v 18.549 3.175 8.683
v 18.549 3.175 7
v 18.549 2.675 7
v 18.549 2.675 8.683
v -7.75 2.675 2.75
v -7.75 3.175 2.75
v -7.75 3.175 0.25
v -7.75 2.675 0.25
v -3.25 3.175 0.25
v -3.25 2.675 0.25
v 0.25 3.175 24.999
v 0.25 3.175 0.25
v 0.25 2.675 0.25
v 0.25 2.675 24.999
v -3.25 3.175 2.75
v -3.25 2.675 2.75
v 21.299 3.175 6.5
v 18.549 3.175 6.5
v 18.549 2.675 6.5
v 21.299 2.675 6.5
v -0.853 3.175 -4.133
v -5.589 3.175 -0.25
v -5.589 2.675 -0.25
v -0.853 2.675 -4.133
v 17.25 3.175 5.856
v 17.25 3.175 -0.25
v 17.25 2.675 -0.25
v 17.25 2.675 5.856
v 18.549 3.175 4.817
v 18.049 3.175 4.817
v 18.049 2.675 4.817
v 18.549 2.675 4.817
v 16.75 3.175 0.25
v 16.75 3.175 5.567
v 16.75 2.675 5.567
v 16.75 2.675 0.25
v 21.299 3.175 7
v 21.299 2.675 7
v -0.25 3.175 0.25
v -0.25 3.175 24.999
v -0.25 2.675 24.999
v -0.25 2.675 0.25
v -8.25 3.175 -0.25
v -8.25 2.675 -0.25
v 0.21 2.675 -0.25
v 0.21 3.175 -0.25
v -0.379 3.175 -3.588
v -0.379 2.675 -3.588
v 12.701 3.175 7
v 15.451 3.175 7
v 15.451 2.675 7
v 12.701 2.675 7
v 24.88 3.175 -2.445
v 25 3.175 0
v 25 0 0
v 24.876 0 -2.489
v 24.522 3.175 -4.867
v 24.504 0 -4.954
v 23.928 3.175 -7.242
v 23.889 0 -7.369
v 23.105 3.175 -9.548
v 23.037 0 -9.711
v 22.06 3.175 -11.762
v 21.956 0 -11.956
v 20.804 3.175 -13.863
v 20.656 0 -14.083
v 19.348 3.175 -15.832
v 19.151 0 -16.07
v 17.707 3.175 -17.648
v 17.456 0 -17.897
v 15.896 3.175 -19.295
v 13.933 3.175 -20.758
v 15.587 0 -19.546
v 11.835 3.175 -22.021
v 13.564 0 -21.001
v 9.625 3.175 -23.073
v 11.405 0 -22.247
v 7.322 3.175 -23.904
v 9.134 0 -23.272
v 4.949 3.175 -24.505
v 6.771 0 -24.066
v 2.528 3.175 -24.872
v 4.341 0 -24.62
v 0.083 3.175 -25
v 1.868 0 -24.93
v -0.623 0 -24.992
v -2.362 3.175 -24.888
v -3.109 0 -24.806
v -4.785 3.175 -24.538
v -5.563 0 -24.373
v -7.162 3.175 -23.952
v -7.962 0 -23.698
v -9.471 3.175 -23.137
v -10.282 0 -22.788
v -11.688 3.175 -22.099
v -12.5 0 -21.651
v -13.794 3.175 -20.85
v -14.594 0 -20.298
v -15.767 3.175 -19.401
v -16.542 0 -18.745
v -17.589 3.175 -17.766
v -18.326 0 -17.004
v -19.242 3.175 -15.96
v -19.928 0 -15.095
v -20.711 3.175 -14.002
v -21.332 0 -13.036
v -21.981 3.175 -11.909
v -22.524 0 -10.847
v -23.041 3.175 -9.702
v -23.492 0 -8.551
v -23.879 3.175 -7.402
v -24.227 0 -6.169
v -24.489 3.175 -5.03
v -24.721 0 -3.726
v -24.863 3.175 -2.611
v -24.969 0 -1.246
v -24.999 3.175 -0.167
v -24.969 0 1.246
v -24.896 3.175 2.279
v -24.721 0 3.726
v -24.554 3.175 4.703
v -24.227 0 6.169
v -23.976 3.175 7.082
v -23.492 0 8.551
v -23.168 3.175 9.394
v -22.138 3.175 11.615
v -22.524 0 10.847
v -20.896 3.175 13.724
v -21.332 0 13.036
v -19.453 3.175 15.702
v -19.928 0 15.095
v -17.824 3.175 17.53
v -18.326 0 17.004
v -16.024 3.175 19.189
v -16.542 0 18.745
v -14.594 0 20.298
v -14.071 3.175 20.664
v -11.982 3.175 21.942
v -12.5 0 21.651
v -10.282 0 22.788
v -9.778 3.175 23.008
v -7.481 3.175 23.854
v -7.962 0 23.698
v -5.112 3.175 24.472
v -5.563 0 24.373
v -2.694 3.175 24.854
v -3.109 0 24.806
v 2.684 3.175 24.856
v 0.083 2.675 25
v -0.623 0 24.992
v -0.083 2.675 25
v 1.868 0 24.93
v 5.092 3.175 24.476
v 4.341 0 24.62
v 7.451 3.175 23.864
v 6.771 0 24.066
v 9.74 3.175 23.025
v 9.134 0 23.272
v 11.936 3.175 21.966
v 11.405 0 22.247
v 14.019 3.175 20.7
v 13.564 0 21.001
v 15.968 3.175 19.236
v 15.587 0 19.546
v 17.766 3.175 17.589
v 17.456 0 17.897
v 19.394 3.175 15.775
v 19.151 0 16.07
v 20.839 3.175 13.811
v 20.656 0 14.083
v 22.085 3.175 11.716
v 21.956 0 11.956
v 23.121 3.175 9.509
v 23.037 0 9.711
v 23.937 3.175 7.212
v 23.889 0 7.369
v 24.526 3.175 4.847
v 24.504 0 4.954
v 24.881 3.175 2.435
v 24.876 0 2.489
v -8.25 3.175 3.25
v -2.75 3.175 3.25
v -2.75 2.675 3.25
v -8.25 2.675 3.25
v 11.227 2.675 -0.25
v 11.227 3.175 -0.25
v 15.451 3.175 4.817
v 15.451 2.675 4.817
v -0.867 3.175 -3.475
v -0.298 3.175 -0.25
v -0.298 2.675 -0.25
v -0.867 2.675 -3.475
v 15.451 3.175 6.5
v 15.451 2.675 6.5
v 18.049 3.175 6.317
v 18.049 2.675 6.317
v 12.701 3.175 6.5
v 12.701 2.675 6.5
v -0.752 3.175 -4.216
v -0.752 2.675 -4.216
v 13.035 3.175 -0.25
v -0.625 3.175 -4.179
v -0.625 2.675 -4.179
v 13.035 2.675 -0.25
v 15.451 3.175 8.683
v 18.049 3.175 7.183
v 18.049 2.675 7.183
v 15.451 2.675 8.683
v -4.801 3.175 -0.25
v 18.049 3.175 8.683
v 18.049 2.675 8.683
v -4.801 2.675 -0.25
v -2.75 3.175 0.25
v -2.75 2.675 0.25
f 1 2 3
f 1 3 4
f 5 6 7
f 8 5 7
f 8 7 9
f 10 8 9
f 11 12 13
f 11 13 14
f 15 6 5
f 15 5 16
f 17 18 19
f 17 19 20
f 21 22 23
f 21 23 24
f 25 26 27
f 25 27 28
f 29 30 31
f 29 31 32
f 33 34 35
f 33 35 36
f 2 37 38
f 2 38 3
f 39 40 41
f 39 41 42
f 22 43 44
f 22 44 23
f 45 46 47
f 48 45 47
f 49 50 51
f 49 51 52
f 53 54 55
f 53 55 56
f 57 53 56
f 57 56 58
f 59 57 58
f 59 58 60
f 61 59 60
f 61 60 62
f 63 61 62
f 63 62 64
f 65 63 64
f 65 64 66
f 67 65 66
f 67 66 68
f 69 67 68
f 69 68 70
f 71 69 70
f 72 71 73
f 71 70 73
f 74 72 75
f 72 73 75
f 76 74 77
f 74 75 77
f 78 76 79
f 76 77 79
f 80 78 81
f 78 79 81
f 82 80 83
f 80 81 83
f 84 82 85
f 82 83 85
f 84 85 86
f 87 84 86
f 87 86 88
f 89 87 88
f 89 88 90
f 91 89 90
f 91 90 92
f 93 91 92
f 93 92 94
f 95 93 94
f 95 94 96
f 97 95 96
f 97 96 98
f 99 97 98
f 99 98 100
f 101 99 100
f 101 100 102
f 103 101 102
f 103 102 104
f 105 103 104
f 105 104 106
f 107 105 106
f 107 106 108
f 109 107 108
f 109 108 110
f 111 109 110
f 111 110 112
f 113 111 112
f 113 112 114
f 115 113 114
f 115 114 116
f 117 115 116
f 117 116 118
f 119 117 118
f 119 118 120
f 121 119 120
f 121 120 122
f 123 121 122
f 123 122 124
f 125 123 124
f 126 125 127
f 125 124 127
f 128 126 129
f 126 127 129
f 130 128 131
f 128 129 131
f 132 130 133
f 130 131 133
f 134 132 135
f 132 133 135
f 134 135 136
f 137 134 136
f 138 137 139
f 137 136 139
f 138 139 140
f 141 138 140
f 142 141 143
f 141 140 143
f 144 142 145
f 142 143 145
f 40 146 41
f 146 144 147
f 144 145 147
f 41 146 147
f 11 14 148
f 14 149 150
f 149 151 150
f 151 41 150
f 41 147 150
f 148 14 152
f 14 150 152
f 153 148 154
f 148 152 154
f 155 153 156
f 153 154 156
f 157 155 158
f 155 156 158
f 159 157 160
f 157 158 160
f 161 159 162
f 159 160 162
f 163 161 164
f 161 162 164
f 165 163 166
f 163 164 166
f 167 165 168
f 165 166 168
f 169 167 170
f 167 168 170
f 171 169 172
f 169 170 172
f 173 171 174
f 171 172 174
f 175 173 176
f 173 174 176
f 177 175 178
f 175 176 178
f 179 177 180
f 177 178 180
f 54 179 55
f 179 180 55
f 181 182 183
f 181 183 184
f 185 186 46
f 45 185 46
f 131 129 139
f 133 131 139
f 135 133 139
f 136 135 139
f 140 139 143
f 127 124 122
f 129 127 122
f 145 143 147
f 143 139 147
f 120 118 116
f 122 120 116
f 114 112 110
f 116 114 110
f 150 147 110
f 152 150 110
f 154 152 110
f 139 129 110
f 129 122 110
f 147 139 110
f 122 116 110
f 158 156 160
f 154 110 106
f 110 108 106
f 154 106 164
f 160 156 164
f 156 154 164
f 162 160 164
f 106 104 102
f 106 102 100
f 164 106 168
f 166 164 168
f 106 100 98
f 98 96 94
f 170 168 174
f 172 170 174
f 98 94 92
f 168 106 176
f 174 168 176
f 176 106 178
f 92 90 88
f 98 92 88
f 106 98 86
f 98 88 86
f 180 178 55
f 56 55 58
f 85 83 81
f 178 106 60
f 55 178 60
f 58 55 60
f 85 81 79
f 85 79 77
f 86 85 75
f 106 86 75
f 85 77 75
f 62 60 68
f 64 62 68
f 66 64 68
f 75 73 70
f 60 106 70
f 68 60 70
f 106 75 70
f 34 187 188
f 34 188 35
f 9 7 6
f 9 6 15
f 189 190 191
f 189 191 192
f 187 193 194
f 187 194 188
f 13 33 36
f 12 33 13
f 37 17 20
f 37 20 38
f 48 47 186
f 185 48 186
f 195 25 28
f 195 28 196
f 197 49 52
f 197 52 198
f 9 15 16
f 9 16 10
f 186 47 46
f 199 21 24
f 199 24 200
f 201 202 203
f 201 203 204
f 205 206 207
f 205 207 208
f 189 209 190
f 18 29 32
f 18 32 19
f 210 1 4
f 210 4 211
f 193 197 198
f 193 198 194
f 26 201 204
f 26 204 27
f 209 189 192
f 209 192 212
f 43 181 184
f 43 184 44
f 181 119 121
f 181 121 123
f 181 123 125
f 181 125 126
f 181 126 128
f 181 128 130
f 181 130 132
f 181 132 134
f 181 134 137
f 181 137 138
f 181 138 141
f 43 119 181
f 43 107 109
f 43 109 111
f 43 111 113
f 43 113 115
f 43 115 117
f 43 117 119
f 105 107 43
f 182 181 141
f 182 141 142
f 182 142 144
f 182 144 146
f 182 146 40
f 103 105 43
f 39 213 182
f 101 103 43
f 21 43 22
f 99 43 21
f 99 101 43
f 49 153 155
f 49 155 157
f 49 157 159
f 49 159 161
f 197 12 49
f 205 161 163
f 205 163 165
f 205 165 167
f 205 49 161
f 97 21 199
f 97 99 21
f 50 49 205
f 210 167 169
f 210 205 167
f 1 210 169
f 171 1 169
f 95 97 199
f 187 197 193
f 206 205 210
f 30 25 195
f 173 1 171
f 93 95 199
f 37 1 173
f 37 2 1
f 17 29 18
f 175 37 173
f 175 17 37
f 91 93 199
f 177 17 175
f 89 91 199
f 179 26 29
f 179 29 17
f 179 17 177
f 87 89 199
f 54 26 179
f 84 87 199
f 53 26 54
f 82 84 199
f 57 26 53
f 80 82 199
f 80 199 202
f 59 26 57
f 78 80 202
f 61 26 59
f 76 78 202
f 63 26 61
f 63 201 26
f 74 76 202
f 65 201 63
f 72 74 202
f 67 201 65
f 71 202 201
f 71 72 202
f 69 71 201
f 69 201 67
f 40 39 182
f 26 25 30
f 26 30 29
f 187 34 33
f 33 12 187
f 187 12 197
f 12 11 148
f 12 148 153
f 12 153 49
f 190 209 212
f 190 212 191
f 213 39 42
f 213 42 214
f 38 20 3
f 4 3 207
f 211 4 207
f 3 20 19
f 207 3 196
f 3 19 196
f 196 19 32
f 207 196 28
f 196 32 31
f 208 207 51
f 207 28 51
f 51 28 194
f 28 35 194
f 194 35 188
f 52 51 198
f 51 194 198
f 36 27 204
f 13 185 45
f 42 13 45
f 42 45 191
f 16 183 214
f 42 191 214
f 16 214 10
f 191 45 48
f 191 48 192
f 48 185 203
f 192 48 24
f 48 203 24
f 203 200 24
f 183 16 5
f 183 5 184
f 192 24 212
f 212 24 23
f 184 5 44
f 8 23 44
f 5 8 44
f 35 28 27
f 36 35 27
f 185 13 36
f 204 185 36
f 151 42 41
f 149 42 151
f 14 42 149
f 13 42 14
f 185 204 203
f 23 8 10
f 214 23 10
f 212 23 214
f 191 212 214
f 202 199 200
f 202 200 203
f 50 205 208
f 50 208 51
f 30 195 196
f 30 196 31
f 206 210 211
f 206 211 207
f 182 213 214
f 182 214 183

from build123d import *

# Parameters (mm, degrees)
SKETCH1_R           = 25
BOSS_EXTRUDE1_DEPTH = 3.175
SKETCH2_W           = 4.5
SKETCH2_H           = 2.5
CUT_EXTRUDE1_DEPTH  = 0.5


with BuildPart() as part:
    # Sketch1 → Boss-Extrude1 (new body)
    with BuildSketch(Plane(origin=(0, 0, 0), x_dir=(1, 0, 0), z_dir=(0, 1, 0))):
        Circle(SKETCH1_R)
    extrude(amount=BOSS_EXTRUDE1_DEPTH)

    # Sketch2 → Cut-Extrude1 (cut)
    with BuildSketch(Plane(origin=(0, 3.175, 0), x_dir=(1, 0, 0), z_dir=(0, 1, 0))):
        with BuildLine():
            Line((17.25, 0.25), (17.25, -5.855662433))
            Line((17.25, -5.855662433), (18.049038106, -6.316987298))
            Line((18.049038106, -6.316987298), (18.049038106, -5.25))
            Line((18.049038106, -5.25), (18.049038106, -4.816987298))
            Line((18.049038106, -4.816987298), (18.549038106, -4.816987298))
            Line((18.549038106, -4.816987298), (18.549038106, -5.25))
            Line((18.549038106, -5.25), (18.549038106, -6.5))
            Line((18.549038106, -6.5), (21.299038106, -6.5))
            Line((21.299038106, -6.5), (21.299038106, -7))
            Line((21.299038106, -7), (18.549038106, -7))
            Line((18.549038106, -7), (18.549038106, -8.25))
            Line((18.549038106, -8.25), (18.549038106, -8.683012702))
            Line((18.549038106, -8.683012702), (18.049038106, -8.683012702))
            Line((18.049038106, -8.683012702), (18.049038106, -8.25))
            Line((18.049038106, -8.25), (18.049038106, -7.183012702))
            Line((18.049038106, -7.183012702), (15.450961894, -8.683012702))
            Line((15.450961894, -8.683012702), (15.450961894, -7))
            Line((15.450961894, -7), (12.700961894, -7))
            Line((12.700961894, -7), (12.700961894, -6.5))
            Line((12.700961894, -6.5), (15.450961894, -6.5))
            Line((15.450961894, -6.5), (15.450961894, -4.816987298))
            Line((15.450961894, -4.816987298), (16.75, -5.566987298))
            Line((16.75, -5.566987298), (16.75, -0.25))
            Line((16.75, -0.25), (0.25, -0.25))
            Line((0.25, -0.25), (0.25, -24.998749969))
            ThreePointArc((0.25, -24.998749969), (0, -25), (-0.25, -24.998749969))
            Line((-0.25, -24.998749969), (-0.25, -0.25))
            Line((-0.25, -0.25), (-2.75, -0.25))
            Line((-2.75, -0.25), (-2.75, -3.25))
            Line((-2.75, -3.25), (-8.25, -3.25))
            Line((-8.25, -3.25), (-8.25, 0.25))
            Line((-8.25, 0.25), (-5.589373118, 0.25))
            Line((-5.589373118, 0.25), (-0.853083665, 4.132571689))
            Line((-0.853083665, 4.132571689), (-0.751596944, 4.215765395))
            Line((-0.751596944, 4.215765395), (-0.625482869, 4.179488852))
            Line((-0.625482869, 4.179488852), (13.035241579, 0.25))
            Line((13.035241579, 0.25), (17.25, 0.25))
        make_face()
        Polygon((-4.800684576, 0.25), (-0.297938398, 0.25), (-0.866588339, 3.47497407), align=None, mode=Mode.SUBTRACT)
        Polygon((0.209774908, 0.25), (-0.378852437, 3.588271558), (11.226526686, 0.25), align=None, mode=Mode.SUBTRACT)
        with Locations((-5.5, -1.5)):
            Rectangle(SKETCH2_W, SKETCH2_H, mode=Mode.SUBTRACT)
    extrude(amount=-CUT_EXTRUDE1_DEPTH, mode=Mode.SUBTRACT)


solid = part.part
